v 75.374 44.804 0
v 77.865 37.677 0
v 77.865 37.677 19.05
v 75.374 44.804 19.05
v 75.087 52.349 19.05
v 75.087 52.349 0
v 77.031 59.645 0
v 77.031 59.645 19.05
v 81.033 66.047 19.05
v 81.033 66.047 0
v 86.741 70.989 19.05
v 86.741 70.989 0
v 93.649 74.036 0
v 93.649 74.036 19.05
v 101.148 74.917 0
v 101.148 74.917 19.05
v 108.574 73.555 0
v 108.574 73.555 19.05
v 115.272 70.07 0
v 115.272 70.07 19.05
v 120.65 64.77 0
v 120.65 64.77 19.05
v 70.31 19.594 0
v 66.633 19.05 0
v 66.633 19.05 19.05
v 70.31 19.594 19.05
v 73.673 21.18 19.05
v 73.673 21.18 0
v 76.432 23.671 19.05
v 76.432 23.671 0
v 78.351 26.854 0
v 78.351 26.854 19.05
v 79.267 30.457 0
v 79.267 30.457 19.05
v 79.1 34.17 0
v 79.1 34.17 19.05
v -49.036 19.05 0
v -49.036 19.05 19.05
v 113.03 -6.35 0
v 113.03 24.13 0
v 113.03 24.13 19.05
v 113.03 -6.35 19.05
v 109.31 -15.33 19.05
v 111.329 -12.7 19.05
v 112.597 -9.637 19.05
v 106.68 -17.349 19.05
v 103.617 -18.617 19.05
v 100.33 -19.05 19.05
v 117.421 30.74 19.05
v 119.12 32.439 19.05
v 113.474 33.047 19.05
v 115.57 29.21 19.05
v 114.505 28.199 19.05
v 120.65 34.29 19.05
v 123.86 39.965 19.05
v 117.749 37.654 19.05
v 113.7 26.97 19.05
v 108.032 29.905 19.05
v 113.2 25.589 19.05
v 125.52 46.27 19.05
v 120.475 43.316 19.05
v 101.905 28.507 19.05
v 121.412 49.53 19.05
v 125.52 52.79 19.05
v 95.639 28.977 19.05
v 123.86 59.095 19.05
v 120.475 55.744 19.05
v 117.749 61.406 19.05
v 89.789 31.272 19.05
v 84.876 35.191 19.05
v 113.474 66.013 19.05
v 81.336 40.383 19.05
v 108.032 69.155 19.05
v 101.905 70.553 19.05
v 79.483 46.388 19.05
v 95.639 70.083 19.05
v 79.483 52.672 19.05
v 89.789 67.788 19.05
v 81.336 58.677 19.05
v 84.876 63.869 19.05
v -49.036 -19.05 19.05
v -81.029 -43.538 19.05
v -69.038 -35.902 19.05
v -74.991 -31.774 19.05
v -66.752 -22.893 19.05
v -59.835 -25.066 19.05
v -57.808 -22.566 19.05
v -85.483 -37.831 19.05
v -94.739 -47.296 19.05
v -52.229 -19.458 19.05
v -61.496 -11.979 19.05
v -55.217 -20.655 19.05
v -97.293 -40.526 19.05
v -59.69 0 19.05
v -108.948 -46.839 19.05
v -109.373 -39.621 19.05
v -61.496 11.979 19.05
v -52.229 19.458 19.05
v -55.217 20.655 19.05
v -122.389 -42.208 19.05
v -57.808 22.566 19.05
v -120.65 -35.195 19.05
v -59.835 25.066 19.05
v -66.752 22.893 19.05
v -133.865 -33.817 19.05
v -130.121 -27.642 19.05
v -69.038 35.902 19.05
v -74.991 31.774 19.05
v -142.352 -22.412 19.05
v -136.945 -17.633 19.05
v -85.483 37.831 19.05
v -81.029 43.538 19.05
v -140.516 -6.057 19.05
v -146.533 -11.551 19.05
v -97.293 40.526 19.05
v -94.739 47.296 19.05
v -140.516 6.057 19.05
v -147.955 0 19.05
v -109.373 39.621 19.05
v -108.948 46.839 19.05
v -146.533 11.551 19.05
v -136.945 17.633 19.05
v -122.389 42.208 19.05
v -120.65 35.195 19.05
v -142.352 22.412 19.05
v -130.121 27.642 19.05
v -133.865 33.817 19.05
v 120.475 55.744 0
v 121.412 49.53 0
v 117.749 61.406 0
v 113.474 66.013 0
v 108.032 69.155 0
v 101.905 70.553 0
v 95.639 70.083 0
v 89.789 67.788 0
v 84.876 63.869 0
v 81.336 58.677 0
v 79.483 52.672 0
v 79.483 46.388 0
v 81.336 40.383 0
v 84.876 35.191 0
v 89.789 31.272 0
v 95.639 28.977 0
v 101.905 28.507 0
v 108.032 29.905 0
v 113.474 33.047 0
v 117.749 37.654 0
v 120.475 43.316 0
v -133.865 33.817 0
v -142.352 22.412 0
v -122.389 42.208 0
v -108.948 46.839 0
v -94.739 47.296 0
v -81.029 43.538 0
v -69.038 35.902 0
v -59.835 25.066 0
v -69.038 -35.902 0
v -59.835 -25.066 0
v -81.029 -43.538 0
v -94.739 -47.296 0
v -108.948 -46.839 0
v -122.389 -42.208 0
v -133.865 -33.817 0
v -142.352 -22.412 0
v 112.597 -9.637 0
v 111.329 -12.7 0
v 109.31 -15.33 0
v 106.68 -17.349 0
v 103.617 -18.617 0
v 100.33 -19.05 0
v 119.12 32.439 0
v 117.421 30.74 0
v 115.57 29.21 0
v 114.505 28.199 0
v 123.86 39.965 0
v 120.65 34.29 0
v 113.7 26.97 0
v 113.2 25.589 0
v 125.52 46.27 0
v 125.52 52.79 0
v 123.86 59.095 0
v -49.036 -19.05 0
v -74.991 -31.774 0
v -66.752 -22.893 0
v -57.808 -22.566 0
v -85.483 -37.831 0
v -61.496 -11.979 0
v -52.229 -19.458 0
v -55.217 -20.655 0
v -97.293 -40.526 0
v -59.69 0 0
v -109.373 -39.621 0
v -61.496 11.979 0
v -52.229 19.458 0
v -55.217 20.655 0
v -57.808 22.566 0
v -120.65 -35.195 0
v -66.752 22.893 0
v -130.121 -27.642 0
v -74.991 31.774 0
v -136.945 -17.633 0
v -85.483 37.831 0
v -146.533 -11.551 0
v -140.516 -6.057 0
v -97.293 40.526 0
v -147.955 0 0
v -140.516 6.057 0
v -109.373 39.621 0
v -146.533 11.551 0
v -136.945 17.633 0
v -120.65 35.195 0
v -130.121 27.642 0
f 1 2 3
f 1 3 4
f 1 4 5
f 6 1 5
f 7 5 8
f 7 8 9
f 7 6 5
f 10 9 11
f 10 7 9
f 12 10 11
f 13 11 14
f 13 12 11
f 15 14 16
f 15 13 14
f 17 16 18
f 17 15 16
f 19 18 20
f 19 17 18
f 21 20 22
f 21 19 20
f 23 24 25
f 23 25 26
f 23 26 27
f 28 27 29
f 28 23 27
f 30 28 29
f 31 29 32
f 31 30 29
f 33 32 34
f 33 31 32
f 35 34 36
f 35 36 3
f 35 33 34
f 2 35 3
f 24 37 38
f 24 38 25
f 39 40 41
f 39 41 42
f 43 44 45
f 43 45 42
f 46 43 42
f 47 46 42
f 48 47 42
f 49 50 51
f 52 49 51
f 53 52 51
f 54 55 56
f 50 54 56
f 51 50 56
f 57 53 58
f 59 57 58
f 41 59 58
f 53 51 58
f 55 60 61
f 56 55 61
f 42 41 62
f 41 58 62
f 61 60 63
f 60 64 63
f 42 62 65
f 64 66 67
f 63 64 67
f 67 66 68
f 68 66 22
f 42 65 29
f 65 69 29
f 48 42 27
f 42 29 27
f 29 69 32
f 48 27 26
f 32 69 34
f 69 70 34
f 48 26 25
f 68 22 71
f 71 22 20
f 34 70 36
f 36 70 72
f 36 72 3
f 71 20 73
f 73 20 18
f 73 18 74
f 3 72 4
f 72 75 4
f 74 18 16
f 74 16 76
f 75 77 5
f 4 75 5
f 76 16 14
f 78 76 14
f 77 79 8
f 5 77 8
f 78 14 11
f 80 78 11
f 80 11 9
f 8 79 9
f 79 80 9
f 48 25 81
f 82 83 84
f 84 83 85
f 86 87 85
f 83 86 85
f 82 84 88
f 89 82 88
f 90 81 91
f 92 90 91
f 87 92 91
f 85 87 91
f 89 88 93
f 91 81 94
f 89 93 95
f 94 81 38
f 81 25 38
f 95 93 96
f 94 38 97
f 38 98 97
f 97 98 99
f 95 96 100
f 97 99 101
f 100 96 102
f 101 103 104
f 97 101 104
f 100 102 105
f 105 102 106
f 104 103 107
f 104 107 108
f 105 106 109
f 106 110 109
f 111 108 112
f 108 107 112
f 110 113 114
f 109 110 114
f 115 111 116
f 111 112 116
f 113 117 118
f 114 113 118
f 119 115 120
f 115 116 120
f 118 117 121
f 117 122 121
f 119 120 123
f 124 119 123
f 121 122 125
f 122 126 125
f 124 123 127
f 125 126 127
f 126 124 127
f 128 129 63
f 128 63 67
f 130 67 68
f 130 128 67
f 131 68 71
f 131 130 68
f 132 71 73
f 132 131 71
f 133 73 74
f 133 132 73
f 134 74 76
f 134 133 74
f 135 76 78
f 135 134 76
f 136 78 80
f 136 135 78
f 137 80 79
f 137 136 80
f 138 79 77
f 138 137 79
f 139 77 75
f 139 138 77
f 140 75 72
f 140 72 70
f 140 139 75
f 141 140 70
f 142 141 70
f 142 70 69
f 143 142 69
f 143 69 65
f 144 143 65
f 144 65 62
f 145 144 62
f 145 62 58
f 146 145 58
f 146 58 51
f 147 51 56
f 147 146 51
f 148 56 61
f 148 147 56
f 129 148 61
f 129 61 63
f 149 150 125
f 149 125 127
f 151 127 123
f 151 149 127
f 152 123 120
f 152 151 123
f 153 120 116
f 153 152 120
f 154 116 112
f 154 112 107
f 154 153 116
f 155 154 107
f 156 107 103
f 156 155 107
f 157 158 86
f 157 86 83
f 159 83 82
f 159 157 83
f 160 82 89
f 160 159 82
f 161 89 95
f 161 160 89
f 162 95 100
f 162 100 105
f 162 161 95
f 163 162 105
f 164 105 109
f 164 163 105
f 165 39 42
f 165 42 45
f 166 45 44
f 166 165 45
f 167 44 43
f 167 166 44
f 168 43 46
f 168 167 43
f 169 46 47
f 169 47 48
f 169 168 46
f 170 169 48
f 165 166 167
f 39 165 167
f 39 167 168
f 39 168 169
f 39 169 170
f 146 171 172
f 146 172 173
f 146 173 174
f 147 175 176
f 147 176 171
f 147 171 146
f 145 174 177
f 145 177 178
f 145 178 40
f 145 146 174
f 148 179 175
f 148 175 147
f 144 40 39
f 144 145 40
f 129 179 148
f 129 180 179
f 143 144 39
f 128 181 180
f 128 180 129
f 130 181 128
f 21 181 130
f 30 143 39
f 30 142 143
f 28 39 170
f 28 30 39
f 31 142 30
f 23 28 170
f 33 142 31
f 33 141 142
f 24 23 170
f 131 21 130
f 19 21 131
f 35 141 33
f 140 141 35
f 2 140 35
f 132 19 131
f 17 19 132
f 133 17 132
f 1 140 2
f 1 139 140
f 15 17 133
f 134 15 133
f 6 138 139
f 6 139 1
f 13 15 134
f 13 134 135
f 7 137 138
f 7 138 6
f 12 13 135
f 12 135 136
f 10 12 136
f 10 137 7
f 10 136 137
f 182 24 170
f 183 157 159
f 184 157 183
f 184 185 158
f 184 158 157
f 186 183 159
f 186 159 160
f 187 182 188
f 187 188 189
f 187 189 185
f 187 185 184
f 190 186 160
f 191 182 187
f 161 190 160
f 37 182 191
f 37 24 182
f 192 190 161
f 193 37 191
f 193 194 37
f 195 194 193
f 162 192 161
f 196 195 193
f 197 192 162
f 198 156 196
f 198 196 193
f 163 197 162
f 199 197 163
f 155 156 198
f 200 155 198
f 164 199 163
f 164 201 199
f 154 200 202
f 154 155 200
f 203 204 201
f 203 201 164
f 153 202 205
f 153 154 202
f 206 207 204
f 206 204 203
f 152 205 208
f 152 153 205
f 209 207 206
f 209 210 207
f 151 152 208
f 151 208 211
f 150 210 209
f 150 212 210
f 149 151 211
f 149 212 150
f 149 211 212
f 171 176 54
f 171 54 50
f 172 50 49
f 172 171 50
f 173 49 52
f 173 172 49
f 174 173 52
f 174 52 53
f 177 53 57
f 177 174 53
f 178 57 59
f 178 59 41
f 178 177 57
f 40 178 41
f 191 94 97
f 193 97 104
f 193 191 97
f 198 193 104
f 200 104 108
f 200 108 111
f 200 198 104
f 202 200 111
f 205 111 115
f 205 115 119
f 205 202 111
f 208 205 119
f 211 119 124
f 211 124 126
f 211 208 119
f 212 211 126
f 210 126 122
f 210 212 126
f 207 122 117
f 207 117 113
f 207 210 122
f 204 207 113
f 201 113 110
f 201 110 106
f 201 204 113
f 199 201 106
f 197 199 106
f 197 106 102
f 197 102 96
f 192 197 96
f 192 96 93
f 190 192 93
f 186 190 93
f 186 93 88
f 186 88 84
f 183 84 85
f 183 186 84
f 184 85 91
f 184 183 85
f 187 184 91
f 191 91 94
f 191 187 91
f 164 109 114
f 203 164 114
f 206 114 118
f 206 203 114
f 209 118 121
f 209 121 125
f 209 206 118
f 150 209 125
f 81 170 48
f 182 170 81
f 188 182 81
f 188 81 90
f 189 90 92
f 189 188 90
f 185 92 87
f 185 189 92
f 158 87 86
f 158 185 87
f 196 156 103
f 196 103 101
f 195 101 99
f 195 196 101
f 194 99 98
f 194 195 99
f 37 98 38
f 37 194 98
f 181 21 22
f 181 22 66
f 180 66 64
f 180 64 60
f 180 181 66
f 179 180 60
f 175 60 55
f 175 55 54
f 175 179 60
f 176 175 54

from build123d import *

# Parameters (mm, degrees)
SKETCH1_R           = 40.64
SKETCH1_R_2         = 21.082
BOSS_EXTRUDE1_DEPTH = 19.05


with BuildPart() as part:
    # Sketch1 → Boss-Extrude1 (new body)
    with BuildSketch(Plane.XY):
        with BuildLine():
            Line((-49.036305212, 19.05), (-12.7, 19.05))
            Line((-12.7, 19.05), (66.63309213, 19.05))
            ThreePointArc((66.63309213, 19.05), (77.50872238, 25.1917482), (77.865394753, 37.676666667))
            ThreePointArc((77.865394753, 37.676666667), (86.740959905, 70.989216885), (120.65, 64.77))
            ThreePointArc((120.65, 64.77), (125.73, 49.53), (120.65, 34.29))
            ThreePointArc((120.65, 34.29), (118.290512242, 31.569487758), (115.57, 29.21))
            ThreePointArc((115.57, 29.21), (113.700387337, 26.969806331), (113.03, 24.13))
            Line((113.03, 24.13), (113.03, -6.35))
            ThreePointArc((113.03, -6.35), (109.310256121, -15.330256121), (100.33, -19.05))
            Line((100.33, -19.05), (12.7, -19.05))
            Line((12.7, -19.05), (-49.036305212, -19.05))
            ThreePointArc((-49.036305212, -19.05), (-55.216941357, -20.655418582), (-59.834977799, -25.065789474))
            ThreePointArc((-59.834977799, -25.065789474), (-101.860987289, -47.600385533), (-142.352058824, -22.411764706))
            ThreePointArc((-142.352058824, -22.411764706), (-147.955, 0), (-142.352058824, 22.411764706))
            ThreePointArc((-142.352058824, 22.411764706), (-101.860987289, 47.600385533), (-59.834977799, 25.065789474))
            ThreePointArc((-59.834977799, 25.065789474), (-55.216941357, 20.655418582), (-49.036305212, 19.05))
        make_face()
        with Locations((-100.33, 0)):
            Circle(SKETCH1_R, mode=Mode.SUBTRACT)
        with Locations((100.33, 49.53)):
            Circle(SKETCH1_R_2, mode=Mode.SUBTRACT)
    extrude(amount=BOSS_EXTRUDE1_DEPTH)


solid = part.part
